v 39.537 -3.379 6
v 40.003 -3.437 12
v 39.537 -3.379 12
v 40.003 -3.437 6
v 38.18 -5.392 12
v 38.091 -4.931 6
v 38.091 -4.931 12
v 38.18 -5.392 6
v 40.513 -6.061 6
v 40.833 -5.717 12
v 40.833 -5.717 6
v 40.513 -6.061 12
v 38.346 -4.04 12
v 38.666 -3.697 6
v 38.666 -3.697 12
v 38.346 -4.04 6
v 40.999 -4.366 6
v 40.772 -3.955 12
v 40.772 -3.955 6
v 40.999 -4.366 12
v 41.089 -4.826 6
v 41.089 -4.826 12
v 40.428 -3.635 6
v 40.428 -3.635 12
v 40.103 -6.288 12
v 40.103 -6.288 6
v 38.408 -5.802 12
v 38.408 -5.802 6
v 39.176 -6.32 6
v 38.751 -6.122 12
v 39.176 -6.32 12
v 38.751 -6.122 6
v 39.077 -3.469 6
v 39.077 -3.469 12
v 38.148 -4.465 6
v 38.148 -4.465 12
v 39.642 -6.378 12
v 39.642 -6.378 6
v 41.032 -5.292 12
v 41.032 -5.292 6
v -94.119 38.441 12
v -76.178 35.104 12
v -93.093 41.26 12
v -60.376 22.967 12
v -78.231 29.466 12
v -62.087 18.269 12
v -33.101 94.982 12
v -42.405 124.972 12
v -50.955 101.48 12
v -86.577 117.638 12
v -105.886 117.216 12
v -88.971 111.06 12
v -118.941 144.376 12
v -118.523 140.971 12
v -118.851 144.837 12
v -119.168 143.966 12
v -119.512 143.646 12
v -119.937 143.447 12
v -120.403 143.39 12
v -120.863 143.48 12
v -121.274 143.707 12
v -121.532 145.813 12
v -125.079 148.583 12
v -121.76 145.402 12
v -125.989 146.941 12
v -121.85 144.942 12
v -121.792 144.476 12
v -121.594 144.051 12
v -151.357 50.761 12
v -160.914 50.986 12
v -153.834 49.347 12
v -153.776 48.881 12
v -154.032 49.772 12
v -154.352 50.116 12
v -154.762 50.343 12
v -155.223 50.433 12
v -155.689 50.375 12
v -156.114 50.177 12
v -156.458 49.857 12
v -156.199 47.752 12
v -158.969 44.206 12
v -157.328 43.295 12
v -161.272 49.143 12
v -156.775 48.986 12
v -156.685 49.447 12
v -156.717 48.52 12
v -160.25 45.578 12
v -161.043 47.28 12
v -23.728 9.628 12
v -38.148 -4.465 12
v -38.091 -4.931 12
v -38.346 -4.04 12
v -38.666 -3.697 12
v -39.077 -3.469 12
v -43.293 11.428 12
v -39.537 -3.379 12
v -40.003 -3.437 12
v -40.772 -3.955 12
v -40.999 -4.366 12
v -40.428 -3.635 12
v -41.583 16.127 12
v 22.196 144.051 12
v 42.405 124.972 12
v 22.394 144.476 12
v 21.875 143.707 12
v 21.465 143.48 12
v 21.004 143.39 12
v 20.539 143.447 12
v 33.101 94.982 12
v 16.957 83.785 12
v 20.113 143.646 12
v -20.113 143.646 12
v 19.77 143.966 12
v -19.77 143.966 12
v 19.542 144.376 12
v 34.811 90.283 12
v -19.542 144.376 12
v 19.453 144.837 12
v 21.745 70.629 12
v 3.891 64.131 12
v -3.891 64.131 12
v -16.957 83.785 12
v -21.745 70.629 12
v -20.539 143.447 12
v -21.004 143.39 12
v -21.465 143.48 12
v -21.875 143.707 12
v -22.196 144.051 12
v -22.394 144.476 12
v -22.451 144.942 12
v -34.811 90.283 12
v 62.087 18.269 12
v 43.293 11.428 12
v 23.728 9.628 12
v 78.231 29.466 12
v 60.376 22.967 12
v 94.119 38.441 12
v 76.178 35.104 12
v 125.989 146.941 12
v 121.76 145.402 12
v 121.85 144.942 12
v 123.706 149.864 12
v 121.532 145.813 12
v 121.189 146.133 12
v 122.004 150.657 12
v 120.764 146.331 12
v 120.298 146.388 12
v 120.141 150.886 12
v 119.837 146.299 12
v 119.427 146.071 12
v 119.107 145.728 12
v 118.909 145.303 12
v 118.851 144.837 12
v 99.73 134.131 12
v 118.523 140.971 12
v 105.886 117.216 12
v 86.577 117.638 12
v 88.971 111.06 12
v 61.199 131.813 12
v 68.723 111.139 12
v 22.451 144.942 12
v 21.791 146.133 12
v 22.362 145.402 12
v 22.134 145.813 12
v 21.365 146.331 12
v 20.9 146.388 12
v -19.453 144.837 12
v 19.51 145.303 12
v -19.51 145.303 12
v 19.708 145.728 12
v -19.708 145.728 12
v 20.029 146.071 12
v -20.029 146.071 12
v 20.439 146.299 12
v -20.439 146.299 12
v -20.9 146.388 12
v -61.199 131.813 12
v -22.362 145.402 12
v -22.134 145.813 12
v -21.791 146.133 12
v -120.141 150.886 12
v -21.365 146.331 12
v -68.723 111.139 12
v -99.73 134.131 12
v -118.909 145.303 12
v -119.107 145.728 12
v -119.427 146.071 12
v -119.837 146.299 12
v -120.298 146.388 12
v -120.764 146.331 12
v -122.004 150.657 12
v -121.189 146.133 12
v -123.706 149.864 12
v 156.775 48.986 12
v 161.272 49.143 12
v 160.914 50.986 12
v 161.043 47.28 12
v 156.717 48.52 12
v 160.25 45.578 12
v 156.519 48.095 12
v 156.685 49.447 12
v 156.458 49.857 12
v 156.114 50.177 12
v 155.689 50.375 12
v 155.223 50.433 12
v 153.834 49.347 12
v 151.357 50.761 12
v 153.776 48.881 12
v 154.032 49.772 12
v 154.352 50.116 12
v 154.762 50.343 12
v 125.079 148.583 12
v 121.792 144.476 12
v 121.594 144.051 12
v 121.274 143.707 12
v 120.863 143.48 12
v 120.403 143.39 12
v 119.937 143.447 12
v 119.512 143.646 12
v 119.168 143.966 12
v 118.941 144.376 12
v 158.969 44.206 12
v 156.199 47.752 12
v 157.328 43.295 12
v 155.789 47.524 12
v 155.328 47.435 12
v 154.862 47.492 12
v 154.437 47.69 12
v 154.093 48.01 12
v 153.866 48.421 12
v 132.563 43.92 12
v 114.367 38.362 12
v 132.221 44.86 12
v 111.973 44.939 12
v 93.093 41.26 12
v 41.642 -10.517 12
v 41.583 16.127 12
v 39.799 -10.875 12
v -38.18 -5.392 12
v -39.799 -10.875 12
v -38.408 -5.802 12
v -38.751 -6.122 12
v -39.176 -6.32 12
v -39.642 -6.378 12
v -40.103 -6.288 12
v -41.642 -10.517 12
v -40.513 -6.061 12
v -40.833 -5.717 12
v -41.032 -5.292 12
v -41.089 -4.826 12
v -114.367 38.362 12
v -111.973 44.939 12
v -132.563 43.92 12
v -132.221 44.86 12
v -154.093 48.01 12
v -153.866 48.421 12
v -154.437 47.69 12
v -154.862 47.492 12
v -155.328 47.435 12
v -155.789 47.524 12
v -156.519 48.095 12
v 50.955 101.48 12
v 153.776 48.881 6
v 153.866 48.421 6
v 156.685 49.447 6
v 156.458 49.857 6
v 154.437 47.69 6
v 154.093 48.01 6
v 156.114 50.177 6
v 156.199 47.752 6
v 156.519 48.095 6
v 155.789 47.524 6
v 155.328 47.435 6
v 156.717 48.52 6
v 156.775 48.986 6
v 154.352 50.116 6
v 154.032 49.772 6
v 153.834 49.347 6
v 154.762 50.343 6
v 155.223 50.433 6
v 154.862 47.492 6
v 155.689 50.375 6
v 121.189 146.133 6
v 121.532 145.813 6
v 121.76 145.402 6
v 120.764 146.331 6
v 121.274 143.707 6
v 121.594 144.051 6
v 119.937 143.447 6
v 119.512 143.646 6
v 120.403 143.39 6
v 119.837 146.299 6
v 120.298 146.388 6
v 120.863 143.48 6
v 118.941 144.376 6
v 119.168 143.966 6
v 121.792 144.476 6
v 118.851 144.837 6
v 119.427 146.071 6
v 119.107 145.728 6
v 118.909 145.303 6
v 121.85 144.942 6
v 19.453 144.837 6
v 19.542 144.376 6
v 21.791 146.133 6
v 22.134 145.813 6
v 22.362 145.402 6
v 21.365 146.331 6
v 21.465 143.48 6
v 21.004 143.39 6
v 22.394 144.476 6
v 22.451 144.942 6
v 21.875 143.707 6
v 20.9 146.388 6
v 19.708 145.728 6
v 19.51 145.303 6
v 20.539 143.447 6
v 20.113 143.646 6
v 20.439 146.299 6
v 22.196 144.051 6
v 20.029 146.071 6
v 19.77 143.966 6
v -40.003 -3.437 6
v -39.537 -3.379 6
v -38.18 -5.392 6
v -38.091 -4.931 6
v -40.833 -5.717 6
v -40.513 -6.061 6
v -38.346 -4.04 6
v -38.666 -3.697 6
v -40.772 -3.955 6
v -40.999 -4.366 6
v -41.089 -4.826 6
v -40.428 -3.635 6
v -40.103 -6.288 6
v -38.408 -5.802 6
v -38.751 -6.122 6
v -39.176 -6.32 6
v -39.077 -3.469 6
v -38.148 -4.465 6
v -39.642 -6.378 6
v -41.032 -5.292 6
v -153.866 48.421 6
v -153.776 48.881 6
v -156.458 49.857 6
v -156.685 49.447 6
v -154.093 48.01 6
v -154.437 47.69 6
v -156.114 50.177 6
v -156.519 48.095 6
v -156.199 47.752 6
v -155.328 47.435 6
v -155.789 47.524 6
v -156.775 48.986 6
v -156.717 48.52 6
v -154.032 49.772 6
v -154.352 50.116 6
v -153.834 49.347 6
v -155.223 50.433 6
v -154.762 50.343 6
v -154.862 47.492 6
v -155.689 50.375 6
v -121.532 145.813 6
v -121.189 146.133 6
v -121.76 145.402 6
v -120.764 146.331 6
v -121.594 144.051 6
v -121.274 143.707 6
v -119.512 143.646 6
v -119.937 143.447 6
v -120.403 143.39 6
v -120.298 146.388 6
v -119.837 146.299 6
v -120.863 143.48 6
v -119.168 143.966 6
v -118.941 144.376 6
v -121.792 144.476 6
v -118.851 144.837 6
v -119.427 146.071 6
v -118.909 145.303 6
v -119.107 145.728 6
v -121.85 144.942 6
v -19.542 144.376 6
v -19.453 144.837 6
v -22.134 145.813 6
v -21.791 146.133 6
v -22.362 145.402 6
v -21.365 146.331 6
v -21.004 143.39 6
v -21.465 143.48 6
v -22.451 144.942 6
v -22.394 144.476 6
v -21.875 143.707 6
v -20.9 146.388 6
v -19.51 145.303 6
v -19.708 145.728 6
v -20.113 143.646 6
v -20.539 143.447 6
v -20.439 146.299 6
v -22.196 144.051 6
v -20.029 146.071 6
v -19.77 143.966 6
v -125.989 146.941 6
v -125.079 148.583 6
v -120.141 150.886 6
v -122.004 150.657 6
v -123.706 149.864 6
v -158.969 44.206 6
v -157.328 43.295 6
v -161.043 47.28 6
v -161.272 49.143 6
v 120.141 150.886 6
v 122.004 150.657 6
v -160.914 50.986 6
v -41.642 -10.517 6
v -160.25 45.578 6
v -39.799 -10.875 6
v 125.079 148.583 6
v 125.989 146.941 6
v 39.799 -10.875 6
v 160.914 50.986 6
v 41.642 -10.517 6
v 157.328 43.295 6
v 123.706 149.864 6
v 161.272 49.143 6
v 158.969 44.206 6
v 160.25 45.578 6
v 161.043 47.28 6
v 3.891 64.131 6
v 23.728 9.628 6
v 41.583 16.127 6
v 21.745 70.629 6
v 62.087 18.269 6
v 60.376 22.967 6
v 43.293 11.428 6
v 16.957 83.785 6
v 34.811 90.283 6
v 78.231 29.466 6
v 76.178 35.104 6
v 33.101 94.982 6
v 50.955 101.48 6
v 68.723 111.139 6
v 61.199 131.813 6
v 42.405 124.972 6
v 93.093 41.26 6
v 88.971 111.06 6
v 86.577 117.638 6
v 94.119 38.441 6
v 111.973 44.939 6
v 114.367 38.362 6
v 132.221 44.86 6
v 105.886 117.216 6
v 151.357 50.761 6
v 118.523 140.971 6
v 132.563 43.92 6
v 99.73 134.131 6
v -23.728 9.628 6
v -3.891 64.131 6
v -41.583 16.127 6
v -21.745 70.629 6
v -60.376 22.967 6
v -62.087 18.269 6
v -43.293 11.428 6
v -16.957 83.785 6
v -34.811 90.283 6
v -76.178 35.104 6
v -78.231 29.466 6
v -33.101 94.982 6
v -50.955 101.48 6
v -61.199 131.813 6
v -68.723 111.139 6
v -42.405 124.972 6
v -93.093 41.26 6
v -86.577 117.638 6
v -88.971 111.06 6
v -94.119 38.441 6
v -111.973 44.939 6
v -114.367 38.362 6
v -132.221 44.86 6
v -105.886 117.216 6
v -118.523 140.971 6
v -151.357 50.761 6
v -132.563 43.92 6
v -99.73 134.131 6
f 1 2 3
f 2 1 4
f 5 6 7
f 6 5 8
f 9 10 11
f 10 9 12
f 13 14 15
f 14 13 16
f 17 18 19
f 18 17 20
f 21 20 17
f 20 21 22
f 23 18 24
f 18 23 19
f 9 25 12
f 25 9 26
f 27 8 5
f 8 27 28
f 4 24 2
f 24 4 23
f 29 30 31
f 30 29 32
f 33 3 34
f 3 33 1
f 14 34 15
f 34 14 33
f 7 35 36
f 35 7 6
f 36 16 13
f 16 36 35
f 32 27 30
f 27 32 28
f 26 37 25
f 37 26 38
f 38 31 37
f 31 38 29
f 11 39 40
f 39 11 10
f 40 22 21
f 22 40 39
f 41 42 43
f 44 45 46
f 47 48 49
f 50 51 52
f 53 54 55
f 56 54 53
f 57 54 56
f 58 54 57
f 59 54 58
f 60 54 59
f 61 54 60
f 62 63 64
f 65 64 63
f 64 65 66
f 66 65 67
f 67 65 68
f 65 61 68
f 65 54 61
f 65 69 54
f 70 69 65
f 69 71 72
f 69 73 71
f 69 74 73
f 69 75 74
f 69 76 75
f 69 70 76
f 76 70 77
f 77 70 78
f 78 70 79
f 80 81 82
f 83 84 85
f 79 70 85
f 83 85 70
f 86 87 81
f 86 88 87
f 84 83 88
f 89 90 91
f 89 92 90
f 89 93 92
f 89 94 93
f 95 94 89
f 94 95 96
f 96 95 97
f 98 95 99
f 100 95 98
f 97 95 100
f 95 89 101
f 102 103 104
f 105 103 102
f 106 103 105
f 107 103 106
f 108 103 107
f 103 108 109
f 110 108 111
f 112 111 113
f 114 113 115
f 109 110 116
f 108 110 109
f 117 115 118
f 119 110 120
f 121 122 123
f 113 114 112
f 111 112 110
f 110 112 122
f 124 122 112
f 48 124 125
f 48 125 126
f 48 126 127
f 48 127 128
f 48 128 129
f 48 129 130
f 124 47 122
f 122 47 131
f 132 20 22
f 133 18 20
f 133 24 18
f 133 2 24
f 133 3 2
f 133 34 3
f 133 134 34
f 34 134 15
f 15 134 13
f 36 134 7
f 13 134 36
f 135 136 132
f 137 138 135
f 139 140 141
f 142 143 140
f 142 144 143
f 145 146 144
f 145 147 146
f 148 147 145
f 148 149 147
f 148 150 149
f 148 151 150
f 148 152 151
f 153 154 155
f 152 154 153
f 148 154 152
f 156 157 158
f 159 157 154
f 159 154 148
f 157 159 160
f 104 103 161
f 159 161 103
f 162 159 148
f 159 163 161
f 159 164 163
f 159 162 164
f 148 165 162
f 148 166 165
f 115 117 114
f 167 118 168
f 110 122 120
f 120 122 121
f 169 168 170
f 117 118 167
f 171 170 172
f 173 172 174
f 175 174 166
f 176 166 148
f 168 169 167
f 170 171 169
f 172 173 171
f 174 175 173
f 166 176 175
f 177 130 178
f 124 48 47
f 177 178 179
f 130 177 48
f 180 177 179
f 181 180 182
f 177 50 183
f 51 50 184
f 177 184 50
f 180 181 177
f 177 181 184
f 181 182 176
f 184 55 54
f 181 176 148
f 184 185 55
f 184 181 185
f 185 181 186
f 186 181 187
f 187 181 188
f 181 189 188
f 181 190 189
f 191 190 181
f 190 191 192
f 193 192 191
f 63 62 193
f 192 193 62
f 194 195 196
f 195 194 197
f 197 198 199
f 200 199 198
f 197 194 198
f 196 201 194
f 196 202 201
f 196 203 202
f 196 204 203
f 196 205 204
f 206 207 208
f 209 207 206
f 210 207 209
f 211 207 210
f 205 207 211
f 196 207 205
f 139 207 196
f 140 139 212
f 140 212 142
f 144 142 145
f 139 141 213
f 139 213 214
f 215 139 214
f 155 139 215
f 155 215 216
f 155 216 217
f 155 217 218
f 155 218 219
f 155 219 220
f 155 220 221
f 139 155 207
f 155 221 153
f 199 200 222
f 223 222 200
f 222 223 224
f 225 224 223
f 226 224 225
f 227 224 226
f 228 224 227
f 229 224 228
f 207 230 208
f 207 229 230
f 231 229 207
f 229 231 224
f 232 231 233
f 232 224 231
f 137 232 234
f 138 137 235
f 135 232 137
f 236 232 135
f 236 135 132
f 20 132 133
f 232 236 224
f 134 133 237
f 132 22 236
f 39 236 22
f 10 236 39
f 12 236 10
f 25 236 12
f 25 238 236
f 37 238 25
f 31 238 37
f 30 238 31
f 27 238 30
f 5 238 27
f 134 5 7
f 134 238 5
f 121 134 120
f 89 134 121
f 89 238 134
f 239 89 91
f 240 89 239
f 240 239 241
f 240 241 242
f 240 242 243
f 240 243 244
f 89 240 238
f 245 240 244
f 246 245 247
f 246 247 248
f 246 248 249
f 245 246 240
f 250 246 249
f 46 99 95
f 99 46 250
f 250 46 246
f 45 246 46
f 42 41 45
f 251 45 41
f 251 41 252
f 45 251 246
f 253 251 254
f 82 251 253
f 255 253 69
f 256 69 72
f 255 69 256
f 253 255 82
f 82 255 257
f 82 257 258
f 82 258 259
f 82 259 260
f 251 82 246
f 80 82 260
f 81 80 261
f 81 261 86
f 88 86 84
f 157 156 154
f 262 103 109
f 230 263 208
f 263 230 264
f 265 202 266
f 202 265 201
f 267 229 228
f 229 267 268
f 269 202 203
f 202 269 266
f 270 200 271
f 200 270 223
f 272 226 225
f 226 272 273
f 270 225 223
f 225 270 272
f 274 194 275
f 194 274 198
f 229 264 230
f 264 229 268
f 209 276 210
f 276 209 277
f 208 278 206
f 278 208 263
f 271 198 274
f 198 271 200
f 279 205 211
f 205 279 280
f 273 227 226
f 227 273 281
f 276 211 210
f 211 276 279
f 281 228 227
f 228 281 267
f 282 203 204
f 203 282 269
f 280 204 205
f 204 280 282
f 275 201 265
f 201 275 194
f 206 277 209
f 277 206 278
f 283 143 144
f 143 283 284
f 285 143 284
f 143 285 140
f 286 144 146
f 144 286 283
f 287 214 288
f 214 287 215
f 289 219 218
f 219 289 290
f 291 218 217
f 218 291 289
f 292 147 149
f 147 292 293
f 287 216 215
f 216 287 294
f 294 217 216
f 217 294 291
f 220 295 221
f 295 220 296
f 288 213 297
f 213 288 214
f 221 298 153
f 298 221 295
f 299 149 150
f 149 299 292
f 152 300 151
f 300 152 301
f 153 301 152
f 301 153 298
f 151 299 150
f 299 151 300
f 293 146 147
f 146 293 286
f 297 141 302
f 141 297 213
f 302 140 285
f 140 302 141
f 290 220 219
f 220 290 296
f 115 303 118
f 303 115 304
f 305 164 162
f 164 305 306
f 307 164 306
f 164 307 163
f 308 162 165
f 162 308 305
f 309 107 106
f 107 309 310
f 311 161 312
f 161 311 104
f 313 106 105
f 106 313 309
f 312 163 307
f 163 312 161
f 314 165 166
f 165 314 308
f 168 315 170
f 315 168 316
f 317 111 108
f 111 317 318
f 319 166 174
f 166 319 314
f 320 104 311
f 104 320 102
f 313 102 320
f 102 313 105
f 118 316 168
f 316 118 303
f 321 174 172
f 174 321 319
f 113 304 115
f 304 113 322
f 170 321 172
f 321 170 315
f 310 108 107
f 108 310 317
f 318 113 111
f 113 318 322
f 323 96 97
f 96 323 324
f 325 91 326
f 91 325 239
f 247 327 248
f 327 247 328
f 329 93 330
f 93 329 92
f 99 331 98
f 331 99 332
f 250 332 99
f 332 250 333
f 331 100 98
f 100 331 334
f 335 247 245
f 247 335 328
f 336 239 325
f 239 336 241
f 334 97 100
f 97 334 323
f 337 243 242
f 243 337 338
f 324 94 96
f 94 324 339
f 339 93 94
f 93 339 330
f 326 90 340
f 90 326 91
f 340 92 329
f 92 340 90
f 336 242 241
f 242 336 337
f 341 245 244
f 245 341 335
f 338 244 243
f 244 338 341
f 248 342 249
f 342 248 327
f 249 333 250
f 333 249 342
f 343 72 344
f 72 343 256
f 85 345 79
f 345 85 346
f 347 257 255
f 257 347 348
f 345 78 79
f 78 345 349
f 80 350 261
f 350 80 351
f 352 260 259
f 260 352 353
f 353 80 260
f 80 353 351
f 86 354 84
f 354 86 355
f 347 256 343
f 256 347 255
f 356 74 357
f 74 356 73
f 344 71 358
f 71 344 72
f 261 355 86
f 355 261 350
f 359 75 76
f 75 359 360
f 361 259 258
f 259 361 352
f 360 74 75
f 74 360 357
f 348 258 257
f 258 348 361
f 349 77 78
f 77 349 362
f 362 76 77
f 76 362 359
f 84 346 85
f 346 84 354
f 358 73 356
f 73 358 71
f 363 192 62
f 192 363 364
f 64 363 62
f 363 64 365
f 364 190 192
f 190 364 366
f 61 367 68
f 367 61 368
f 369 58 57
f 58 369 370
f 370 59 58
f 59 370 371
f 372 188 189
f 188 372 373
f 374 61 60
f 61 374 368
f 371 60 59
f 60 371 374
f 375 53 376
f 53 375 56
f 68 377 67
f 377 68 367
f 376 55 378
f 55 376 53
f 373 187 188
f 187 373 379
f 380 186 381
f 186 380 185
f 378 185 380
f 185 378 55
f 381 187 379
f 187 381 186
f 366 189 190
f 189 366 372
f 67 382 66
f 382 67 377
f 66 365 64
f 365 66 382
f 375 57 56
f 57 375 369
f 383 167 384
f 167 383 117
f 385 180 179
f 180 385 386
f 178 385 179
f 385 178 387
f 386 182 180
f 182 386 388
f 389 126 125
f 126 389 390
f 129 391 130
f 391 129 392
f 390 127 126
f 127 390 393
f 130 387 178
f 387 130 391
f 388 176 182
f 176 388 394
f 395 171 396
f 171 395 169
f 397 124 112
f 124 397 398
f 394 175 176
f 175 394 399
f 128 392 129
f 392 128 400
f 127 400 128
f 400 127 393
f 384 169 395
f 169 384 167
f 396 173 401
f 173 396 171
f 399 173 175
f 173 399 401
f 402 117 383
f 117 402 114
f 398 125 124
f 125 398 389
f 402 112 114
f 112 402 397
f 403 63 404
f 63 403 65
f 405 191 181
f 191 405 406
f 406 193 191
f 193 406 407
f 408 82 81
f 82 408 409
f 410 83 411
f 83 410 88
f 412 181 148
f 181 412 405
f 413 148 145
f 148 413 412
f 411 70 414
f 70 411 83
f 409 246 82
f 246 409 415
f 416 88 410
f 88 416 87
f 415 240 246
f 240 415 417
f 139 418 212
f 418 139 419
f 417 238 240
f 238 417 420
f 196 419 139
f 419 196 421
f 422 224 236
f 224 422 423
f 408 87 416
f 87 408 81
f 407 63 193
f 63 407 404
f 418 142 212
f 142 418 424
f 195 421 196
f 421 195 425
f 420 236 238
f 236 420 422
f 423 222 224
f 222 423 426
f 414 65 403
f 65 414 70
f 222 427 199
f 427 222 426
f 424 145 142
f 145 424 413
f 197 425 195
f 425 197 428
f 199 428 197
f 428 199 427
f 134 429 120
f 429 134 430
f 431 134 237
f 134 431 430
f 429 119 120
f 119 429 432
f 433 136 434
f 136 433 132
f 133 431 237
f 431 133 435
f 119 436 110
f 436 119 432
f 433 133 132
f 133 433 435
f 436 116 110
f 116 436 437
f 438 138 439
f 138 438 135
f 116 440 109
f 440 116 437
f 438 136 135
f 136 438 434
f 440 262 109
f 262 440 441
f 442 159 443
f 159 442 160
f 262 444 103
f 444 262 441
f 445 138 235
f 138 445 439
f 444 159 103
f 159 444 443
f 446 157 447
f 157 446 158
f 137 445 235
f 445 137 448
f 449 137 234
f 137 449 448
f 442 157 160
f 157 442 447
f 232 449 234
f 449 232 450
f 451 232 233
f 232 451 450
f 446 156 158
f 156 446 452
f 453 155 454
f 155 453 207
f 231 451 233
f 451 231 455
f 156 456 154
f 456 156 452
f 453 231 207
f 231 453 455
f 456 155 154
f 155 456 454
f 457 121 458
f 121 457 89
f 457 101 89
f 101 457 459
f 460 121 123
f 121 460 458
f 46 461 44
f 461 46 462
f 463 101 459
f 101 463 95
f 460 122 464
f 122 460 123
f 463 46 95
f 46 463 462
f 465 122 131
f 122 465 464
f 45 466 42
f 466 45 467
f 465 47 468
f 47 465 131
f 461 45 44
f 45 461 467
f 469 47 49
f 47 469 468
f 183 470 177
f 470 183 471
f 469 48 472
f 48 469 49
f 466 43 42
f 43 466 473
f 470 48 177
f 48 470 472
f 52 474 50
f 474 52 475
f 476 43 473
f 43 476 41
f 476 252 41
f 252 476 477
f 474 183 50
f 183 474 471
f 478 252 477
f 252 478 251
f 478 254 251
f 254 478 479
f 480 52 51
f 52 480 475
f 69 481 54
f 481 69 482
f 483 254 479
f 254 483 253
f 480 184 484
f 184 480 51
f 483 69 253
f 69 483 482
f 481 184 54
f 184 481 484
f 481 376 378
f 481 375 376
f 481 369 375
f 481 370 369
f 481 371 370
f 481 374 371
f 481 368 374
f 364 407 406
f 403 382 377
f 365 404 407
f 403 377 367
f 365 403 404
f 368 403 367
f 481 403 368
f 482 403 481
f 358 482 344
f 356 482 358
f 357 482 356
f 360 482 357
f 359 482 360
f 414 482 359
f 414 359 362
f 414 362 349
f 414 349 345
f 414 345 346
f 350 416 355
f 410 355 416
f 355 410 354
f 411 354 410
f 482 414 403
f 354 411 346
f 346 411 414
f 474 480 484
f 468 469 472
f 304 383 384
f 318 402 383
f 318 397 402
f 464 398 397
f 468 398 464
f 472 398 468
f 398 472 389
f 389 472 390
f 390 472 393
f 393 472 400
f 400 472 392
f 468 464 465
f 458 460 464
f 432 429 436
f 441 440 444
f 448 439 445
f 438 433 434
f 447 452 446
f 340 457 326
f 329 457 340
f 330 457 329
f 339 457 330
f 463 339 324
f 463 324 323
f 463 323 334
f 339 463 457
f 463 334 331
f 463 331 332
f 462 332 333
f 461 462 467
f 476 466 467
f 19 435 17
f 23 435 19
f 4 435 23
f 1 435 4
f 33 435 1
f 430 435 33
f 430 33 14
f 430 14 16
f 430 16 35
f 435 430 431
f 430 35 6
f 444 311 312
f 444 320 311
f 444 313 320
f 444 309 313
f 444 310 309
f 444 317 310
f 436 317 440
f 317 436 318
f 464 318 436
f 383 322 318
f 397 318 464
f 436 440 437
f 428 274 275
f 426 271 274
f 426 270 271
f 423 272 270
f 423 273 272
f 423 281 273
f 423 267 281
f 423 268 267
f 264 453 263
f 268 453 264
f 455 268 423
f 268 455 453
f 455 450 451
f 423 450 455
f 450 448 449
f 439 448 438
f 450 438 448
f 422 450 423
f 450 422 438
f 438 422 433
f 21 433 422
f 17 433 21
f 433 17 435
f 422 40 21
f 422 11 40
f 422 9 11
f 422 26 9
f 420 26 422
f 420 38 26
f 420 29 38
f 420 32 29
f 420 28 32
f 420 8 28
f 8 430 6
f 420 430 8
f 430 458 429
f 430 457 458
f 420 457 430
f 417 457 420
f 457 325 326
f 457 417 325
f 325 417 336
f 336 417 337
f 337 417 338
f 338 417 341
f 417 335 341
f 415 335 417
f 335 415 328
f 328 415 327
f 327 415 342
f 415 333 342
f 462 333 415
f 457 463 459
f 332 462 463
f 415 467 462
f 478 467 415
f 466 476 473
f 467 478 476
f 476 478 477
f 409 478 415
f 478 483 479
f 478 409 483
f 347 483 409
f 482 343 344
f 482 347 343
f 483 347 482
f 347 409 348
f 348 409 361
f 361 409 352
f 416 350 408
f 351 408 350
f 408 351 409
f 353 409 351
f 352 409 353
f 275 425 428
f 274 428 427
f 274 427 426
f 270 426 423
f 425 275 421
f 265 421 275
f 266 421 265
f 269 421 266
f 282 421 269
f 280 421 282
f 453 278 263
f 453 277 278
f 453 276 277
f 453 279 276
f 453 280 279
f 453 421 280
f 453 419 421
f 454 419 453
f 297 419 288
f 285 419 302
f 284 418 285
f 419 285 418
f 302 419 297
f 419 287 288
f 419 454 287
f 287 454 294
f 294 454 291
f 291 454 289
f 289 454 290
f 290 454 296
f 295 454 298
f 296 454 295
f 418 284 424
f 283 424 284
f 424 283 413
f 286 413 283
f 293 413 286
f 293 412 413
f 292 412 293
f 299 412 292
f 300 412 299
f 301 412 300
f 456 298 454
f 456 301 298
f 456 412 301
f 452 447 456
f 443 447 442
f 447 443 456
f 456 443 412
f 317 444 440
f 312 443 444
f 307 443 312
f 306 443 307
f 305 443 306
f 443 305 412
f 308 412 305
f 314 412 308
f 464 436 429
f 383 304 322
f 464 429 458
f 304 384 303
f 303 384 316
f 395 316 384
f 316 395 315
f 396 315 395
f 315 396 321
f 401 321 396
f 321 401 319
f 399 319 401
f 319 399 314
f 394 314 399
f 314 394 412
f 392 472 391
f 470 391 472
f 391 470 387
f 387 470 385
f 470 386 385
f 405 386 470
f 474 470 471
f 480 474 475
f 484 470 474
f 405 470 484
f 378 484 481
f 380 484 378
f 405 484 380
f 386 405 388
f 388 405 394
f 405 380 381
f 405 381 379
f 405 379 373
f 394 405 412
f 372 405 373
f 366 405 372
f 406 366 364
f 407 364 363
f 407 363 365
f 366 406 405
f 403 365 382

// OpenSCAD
// -*- mode: c -*-
/* All distances are in mm. */

/* set output quality */
$fn = 20;

/* Distance between key centers. */
IN_COLUMN_SPACING   = 19;
IN_ROW_SPACING      = IN_COLUMN_SPACING;

/* This number should exceed ROW_SPACING and COLUMN_SPACING. The
    default gives a 1mm = (20mm - 19mm) gap between keycaps and cuts in
    the top plate.*/
KEY_HOLE_SIZE = 20;

/* Rotation ange; the angle between the halves is twice this
   number */
ANGLE = 20;

/* The radius of screw holes. Holes will be slightly bigger due
   to the cut width. */
SCREW_HOLE_RADIUS = 1.5;

/* Each screw hole is a hole in a "washer". How big these "washers"
   should be depends on the material used: this parameter and the
   `SWITCH_HOLE_SIZE` determine the spacer wall thickness. */
WASHER_HOLE_RADIUS     = 4 * SCREW_HOLE_RADIUS;

/* This constant allows tweaking the location of the screw holes near
   the USB cable. Only useful with small `angle` values. Try the value
   of 10 with angle=0. */
BACK_SCREW_HOLE_OFFSET = 0;

/* Distance between halves. */
HAND_SEPARATION        = 15;

/* The approximate size of switch holes. Used to determine how
   thick walls can be, i.e. how much room around each switch hole to
   leave. See spacer(). */
SWITCH_HOLE_SIZE = 14;

/* Sets whether the case should use notched switch holes. As far as I can
   tell these notches are not all that useful... */
USE_NOTCHED_HOLES = false;

/* Number of rows and columns in the matrix. You need to update
   STAGGERING_OFFSETS and COL_KEY_COUNTS if you change NB_COLS. */
NB_COLS = 7;
COL_KEY_COUNTS = [3, 4, 4, 5, 4, 4, 5]; // Number of keys per columns
MAX_NB_ROWS = 5; // Highest value in COL_KEY_COUNTS

/* Vertical column staggering offsets. The 1st element should
   be zero (innermost column) */
STAGGERING_OFFSETS = [10, 5, 10, 16, 13, 6, 5];

/* The width of the USB cable hole in the spacer. */
CABLE_HOLE_WIDTH = 12;

/* Default z height value for various holes */
HOLE_HEIGHT = 50;

/***************************************************/
/* Rotate children of `angle` degrees around `center`. */
module rotate_children(angle, center=undef) {
    translate(center) {
    rotate(angle) {
        translate(-center) {
            for (i=[0:$children-1])
            children(i);
      }
    }
  }
}

/* Compute coordinates of a point obtained by rotating the point p of angle
   degrees around center. Used to compute locations of screw holes near the
   USB cable hole. */
function rotate_func(p, angle, center) = [cos(angle) * (p[0] - center[0]) - sin(angle) * (p[1] - center[1]) + center[0],
                                        sin(angle) * (p[0] - center[0]) + cos(angle) * (p[1] - center[1]) + center[1]];

/* Cherry MX switch hole centered at `position`. Sizes come
   from the ErgoDox design. */
module create_switch_hole(position, notches=USE_NOTCHED_HOLES) {
    hole_size    = 13.97;
    notch_width  = 3.5001;
    notch_offset = 4.2545;
    notch_depth  = 0.8128;
    translate(position) {
        union() {
            translate([0,0,-1])
            cube([hole_size, hole_size, HOLE_HEIGHT], center=true);
            if (notches == true) {
                translate([0, notch_offset,-1]) {
                    cube([hole_size+2*notch_depth, notch_width, HOLE_HEIGHT], center=true);
                }
                translate([0, -notch_offset,-1]) {
                    cube([hole_size+2*notch_depth, notch_width, HOLE_HEIGHT], center=true);
                }
            }
        }
    }
};

/* Create a hole for a key. */
module create_key_hole(position, size) {
    translate(position) {
        cube([size, size, HOLE_HEIGHT], center=true);
    }
}

/* Create a column of keys. if create_switch_holes is true, creates switch holes
   otherwise creates key holes. */
module create_column(bottom_position, create_switch_holes, key_size=KEY_HOLE_SIZE, row_count) {
    translate(bottom_position) {
        for (i = [0:(row_count-1)]) {
            if (SWITCH_HOLE_SIZE == true) {
                create_switch_hole([0, i*IN_COLUMN_SPACING, -1]);
            } else {
                create_key_hole([0, i*IN_COLUMN_SPACING, -1], key_size);
            }
        }
    }
}

/* Rotate the right half of the keys around the top left corner of
   the innermost column. */
module rotate_half() {
    rotation_center_x = HAND_SEPARATION;
    rotation_center_y = COL_KEY_COUNTS[0] * IN_COLUMN_SPACING;
    for (i=[0:$children-1]) {
        rotate_children(ANGLE, [rotation_center_x, rotation_center_y]) {
        children(i);
    }
  }
}

/* Shift everything right to get desired hand separation. */
module add_hand_separation() {
    for (i=[0:$children-1]) {
        // We use half of the hand separation value to reach desired separation because of mirroring
        translate([0.5*HAND_SEPARATION, 0]) {
            children(i);
        }
    }
}

/* Create switch holes (create_switch_holes=true) or key holes (create_switch_holes=false)
   for the right half of the keyboard. Different key_sizes are used in top_plate() and
   spacer(). */
module create_right_half_holes(create_switch_holes=true, key_size=KEY_HOLE_SIZE) {
    x_offset = 0.5 * IN_ROW_SPACING;
    y_offset = 0.5 * IN_COLUMN_SPACING;
    thumb_key_offset = y_offset + 0.5 * IN_COLUMN_SPACING;
    rotate_half() {
        add_hand_separation() {
            for (c=[0:(NB_COLS-1)]) {
                create_column([x_offset + c*IN_ROW_SPACING, y_offset + STAGGERING_OFFSETS[c]], SWITCH_HOLE_SIZE, key_size, COL_KEY_COUNTS[c]);
            }
        }
    }
}

module create_left_half_holes(create_switch_holes=true, key_size=KEY_HOLE_SIZE) {
  mirror ([1,0,0]) { create_right_half_holes(create_switch_holes, key_size); }
}

 /* Create a screw hole of radius `radius` at a location
    `offset_radius` from `position`, (diagonally), in the direction
    `direction`. Oh, what a mess this is.
    `direction` is the 2-element vector specifying to which side of
     position to move to, [-1, -1] for bottom left, etc. */
module create_screw_hole(radius, offset_radius, position, direction) {
    /* radius_offset is the offset in the x (or y) direction so that
        we're offset_radius from position */
    radius_offset = offset_radius / sqrt(2);
    /* key_hole_offset if the difference between key spacing and key
        hole edge */
    key_hole_offset = 0.5*(IN_ROW_SPACING - KEY_HOLE_SIZE);
    x = position[0] + (radius_offset - key_hole_offset) * direction[0];
    y = position[1] + (radius_offset - key_hole_offset) * direction[1];
    translate([x,y,0]) {
        cylinder(r1=radius,r2=radius,h=3);
    }
}

module create_right_screw_holes(hole_radius) {
    /* coordinates of the back right screw hole before rotation... */
    back_right = [(NB_COLS)*IN_ROW_SPACING, STAGGERING_OFFSETS[NB_COLS-1] + COL_KEY_COUNTS[NB_COLS-1] * IN_COLUMN_SPACING];
    /* and after */
    tmp = rotate_func(back_right, ANGLE, [0, 2.25*IN_COLUMN_SPACING]);

    nudge = 0.75;

    rotate_half() {
        add_hand_separation() {
        // bottom center 
        create_screw_hole(hole_radius, WASHER_HOLE_RADIUS, [13, -6], [-nudge, -nudge]);
        // bottom right
        create_screw_hole(hole_radius, WASHER_HOLE_RADIUS, [(NB_COLS)*IN_ROW_SPACING, STAGGERING_OFFSETS[NB_COLS-1]], [nudge, -nudge]);
        // top right
        create_screw_hole(hole_radius, WASHER_HOLE_RADIUS, back_right, [nudge, nudge]);
        }
    }
    /* add the screw hole near the cable hole */
    translate([WASHER_HOLE_RADIUS - tmp[0], BACK_SCREW_HOLE_OFFSET]) {
        rotate_half() {
            add_hand_separation() {
                create_screw_hole(hole_radius, WASHER_HOLE_RADIUS, back_right, [nudge, nudge]);
            }
        }
    }
}

/* Create all the screw holes. */
module create_screw_holes(hole_radius) {
    create_right_screw_holes(hole_radius);
    mirror ([1,0,0]) { 
        create_right_screw_holes(hole_radius);
    }
}

/* bottom layer of the case */
module create_bottom_plate() {
    difference() {
        hull() { create_screw_holes(WASHER_HOLE_RADIUS); }
        create_screw_holes(SCREW_HOLE_RADIUS);
    }
}

/* top layer of the case */
module create_top_plate() {
    difference() {
        create_bottom_plate();
        create_right_half_holes(false);
        create_left_half_holes(false);
    }
}

/* the switch plate */
module create_switch_plate() {
    difference() {
        create_bottom_plate();
        create_right_half_holes();
        create_left_half_holes();
  }
}

/* Create a spacer. */
module create_spacer() {
    difference() {
        union() {
            difference() {
                create_bottom_plate();
                hull() {
                    create_right_half_holes(create_switch_holes=false, key_size=SWITCH_HOLE_SIZE + 3);
                    create_left_half_holes(create_switch_holes=false, key_size=SWITCH_HOLE_SIZE + 3);
                }
                /* add the USB cable hole: */
                translate([-0.5*CABLE_HOLE_WIDTH, 2*IN_COLUMN_SPACING,0]) {
                    cube([CABLE_HOLE_WIDTH, (2*MAX_NB_ROWS) * IN_COLUMN_SPACING,HOLE_HEIGHT]);
                }
            }
            create_screw_holes(WASHER_HOLE_RADIUS);
        }
        create_screw_holes(SCREW_HOLE_RADIUS);
    }
}

/* Now create all four layers. */
translate([0,0,9]) create_top_plate();
translate([0, 0, 6]) { create_switch_plate(); }
//translate([0, 0,0]) { create_bottom_plate(); }
//translate([0,0,3]) create_spacer();
//translate([0, 0,0]) create_spacer();
